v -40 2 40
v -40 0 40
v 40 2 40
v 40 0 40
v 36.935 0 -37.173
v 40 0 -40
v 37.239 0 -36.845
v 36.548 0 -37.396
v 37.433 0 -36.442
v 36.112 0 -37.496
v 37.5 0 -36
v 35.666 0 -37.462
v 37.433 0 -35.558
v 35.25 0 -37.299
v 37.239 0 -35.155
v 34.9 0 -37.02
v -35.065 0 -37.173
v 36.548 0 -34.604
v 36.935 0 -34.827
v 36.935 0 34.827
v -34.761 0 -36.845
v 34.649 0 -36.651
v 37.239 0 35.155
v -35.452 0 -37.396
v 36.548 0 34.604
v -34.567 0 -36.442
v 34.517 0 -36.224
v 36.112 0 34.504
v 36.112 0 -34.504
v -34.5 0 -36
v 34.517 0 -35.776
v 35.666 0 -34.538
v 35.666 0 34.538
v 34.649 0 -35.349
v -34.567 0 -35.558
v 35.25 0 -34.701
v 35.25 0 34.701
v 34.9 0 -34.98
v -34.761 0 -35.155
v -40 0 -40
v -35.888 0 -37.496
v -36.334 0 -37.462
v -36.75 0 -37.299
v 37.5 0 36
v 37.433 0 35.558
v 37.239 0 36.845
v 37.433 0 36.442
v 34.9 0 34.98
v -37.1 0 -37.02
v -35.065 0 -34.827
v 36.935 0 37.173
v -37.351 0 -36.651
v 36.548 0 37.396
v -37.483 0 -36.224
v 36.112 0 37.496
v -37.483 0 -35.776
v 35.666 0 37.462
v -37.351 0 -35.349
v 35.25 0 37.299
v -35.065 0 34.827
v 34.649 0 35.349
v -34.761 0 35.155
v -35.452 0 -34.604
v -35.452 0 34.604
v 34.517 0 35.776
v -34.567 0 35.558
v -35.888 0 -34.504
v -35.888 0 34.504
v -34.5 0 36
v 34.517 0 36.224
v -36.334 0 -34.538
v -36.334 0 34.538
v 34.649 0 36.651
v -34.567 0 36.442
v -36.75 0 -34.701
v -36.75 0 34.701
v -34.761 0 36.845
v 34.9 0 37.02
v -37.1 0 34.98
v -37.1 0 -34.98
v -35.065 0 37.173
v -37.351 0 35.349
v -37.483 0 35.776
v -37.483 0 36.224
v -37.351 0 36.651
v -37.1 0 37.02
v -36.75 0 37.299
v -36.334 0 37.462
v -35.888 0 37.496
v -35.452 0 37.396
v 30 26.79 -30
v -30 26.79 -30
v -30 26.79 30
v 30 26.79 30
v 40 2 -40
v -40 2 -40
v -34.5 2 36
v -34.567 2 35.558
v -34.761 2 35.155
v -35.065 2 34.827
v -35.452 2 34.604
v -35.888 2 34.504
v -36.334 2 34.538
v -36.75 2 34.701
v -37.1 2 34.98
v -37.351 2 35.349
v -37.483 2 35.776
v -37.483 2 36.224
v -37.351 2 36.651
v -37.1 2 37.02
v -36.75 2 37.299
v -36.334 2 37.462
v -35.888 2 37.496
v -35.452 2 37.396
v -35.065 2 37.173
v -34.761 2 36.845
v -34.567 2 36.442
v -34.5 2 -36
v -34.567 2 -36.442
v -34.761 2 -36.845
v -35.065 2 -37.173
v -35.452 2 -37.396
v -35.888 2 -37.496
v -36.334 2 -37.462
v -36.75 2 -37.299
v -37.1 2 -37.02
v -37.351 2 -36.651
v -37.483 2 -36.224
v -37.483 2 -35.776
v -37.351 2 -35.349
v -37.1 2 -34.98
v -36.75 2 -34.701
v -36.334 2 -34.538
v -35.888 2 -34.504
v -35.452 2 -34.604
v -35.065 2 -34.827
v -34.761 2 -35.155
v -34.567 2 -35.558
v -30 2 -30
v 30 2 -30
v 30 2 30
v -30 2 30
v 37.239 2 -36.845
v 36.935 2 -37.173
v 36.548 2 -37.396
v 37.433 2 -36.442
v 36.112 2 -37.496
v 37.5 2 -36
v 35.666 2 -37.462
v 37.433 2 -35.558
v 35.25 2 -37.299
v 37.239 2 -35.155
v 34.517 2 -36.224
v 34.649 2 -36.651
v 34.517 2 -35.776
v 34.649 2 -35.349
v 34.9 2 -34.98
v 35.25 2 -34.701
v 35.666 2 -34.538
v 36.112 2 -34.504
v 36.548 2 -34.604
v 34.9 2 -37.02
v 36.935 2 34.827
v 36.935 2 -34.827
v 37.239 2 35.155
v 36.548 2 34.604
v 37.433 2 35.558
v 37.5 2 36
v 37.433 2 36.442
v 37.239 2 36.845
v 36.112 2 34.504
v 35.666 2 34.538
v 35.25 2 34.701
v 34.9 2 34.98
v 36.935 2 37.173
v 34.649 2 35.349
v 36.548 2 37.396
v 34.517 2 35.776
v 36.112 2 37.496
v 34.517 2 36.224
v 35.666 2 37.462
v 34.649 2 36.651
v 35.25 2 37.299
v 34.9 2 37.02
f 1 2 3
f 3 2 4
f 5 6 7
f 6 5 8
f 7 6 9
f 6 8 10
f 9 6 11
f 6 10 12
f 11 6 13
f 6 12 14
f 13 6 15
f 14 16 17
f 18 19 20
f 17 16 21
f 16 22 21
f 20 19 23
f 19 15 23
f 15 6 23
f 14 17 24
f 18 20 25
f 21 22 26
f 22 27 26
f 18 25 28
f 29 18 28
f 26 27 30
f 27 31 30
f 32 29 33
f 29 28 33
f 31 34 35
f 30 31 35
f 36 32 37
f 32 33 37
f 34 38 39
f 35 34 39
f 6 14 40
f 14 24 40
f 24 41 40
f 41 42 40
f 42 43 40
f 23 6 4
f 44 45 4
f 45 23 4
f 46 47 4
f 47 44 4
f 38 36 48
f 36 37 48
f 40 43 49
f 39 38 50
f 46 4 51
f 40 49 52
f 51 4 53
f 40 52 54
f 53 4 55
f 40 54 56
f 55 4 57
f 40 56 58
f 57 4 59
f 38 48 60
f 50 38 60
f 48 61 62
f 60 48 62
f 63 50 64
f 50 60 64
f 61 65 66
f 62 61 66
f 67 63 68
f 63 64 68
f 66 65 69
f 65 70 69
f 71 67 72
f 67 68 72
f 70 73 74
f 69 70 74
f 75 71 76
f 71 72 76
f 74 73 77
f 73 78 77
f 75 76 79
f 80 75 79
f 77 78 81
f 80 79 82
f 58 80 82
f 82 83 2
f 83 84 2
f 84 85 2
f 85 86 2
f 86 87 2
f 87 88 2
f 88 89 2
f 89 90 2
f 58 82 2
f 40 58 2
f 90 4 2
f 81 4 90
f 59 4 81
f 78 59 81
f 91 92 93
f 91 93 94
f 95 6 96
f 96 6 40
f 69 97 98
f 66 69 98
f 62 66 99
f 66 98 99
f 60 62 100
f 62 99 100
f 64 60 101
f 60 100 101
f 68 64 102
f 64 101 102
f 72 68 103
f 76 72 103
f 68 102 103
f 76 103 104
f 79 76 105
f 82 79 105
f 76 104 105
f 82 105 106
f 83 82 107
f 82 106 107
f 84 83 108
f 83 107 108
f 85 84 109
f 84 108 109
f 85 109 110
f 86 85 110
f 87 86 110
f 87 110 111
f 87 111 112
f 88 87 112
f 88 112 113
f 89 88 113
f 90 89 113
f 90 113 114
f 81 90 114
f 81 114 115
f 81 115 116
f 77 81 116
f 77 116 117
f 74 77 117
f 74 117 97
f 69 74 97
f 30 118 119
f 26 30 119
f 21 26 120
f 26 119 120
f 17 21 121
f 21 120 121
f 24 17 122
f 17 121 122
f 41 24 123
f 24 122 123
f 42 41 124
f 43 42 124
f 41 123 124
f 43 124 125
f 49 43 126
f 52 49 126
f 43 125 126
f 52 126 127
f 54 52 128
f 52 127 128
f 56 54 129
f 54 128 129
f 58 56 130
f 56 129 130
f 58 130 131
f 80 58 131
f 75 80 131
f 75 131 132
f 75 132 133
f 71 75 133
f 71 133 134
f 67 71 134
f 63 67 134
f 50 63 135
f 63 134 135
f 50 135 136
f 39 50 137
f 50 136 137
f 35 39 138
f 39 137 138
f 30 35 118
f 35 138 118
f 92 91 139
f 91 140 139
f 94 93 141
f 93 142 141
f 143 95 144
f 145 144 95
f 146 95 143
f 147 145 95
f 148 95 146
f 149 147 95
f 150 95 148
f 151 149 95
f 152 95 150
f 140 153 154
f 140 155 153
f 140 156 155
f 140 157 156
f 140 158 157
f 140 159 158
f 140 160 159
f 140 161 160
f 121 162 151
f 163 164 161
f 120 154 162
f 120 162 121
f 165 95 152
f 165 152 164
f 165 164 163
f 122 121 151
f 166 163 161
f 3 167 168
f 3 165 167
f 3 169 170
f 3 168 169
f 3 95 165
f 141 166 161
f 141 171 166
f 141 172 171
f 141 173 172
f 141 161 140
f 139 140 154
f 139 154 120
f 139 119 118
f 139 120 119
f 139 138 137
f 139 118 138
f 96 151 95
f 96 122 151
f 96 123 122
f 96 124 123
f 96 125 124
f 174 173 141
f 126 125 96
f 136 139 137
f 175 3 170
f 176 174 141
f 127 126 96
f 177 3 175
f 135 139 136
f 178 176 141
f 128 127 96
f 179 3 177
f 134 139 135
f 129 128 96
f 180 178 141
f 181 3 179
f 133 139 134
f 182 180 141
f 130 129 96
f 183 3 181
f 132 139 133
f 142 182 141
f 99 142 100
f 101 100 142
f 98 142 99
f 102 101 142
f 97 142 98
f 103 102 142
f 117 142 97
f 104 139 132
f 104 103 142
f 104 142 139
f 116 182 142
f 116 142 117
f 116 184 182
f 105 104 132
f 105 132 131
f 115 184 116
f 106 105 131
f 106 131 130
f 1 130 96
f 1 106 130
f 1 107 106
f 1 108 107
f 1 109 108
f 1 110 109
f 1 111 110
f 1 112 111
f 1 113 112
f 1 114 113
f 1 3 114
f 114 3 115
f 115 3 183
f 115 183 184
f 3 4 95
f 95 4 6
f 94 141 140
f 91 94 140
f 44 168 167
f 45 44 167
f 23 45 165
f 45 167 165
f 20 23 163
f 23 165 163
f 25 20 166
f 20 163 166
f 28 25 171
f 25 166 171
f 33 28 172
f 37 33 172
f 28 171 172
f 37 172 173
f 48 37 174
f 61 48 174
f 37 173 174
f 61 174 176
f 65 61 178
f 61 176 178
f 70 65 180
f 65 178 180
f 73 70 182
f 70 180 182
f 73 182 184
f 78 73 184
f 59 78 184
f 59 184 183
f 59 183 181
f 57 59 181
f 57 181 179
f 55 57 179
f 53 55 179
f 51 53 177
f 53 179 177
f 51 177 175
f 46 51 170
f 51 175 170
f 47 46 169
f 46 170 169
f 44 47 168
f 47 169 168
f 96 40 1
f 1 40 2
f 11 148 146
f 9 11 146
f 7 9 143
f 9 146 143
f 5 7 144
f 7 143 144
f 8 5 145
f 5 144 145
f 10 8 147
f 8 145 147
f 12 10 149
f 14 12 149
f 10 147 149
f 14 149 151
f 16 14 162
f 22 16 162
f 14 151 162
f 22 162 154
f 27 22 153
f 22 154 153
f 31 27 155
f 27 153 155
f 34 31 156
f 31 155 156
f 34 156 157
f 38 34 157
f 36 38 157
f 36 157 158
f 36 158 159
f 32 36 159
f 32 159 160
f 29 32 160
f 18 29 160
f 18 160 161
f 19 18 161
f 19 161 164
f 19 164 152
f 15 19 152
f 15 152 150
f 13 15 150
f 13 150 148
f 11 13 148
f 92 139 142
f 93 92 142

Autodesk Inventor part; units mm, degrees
ref_plane "YZ Plane" through (0, 0, 0) normal (1, 0, 0) x (0, 1, 0)
ref_plane "XZ Plane" through (0, 0, 0) normal (0, 1, 0) x (-1, 0, 0)
ref_plane "XY Plane" through (0, 0, 0) normal (0, 0, 1) x (1, 0, 0)
sketch "Esquisse1" plane through (0, 0, 0) normal (0, 1, 0) x (-1, 0, 0)
  line L0 (40, 40) -> (-40, 40)
  line L1 (-40, 40) -> (-40, -40)
  line L2 (-40, -40) -> (40, -40)
  line L3 (40, -40) -> (40, 40)
  point P0 (0, 0)
  dimension "d0" = 80
  dimension "d1" = 80
  dimension "d2" = 40
  dimension "d3" = 40
extrude "Extrusion1" add sketch "Esquisse1" along normal blind 2
sketch "Esquisse2" plane through (0, 2, 0) normal (0, 1, 0) x (1, 0, 0)
  line L0 (-36, -36) -> (36, -36) construction
  line L1 (36, -36) -> (36, 36) construction
  line L2 (36, 36) -> (-36, 36) construction
  line L3 (-36, 36) -> (-36, -36) construction
  circle A0 centre (-36, -36) radius 1.5
  circle A1 centre (-36, 36) radius 1.5
  circle A2 centre (36, 36) radius 1.5
  circle A3 centre (36, -36) radius 1.5
  point P0 (0, 0)
  dimension "d6" = 3
  dimension "d7" = 3
  dimension "d8" = 3
  dimension "d9" = 3
  dimension "d10" = 72
  dimension "d11" = 72
  dimension "d12" = 36
  dimension "d13" = 36
extrude "Extrusion2" cut sketch "Esquisse2" against normal through all
sketch "Esquisse3" plane through (0, 2, 0) normal (0, 1, 0) x (1, 0, 0)
  line L0 (-30, -30) -> (30, -30)
  line L1 (30, -30) -> (30, 30)
  line L2 (30, 30) -> (-30, 30)
  line L3 (-30, 30) -> (-30, -30)
  point P0 (0, 0)
  dimension "d16" = 60
  dimension "d17" = 60
  dimension "d18" = 30
  dimension "d19" = 30
extrude "Extrusion3" add sketch "Esquisse3" along normal blind 24.79
equation "\"d2\" = 0.5 * d0"
equation "\"d3\" = 0.5 * d1"
equation "\"d7\" = d6"
equation "\"d8\" = d6"
equation "\"d9\" = d6"
equation "\"d12\" = 0.5 * d11"
equation "\"d13\" = 0.5 * d10"
equation "\"d18\" = 0.5 * d16"
equation "\"d19\" = 0.5 * d17"
properties part number "rolling_base_board"
